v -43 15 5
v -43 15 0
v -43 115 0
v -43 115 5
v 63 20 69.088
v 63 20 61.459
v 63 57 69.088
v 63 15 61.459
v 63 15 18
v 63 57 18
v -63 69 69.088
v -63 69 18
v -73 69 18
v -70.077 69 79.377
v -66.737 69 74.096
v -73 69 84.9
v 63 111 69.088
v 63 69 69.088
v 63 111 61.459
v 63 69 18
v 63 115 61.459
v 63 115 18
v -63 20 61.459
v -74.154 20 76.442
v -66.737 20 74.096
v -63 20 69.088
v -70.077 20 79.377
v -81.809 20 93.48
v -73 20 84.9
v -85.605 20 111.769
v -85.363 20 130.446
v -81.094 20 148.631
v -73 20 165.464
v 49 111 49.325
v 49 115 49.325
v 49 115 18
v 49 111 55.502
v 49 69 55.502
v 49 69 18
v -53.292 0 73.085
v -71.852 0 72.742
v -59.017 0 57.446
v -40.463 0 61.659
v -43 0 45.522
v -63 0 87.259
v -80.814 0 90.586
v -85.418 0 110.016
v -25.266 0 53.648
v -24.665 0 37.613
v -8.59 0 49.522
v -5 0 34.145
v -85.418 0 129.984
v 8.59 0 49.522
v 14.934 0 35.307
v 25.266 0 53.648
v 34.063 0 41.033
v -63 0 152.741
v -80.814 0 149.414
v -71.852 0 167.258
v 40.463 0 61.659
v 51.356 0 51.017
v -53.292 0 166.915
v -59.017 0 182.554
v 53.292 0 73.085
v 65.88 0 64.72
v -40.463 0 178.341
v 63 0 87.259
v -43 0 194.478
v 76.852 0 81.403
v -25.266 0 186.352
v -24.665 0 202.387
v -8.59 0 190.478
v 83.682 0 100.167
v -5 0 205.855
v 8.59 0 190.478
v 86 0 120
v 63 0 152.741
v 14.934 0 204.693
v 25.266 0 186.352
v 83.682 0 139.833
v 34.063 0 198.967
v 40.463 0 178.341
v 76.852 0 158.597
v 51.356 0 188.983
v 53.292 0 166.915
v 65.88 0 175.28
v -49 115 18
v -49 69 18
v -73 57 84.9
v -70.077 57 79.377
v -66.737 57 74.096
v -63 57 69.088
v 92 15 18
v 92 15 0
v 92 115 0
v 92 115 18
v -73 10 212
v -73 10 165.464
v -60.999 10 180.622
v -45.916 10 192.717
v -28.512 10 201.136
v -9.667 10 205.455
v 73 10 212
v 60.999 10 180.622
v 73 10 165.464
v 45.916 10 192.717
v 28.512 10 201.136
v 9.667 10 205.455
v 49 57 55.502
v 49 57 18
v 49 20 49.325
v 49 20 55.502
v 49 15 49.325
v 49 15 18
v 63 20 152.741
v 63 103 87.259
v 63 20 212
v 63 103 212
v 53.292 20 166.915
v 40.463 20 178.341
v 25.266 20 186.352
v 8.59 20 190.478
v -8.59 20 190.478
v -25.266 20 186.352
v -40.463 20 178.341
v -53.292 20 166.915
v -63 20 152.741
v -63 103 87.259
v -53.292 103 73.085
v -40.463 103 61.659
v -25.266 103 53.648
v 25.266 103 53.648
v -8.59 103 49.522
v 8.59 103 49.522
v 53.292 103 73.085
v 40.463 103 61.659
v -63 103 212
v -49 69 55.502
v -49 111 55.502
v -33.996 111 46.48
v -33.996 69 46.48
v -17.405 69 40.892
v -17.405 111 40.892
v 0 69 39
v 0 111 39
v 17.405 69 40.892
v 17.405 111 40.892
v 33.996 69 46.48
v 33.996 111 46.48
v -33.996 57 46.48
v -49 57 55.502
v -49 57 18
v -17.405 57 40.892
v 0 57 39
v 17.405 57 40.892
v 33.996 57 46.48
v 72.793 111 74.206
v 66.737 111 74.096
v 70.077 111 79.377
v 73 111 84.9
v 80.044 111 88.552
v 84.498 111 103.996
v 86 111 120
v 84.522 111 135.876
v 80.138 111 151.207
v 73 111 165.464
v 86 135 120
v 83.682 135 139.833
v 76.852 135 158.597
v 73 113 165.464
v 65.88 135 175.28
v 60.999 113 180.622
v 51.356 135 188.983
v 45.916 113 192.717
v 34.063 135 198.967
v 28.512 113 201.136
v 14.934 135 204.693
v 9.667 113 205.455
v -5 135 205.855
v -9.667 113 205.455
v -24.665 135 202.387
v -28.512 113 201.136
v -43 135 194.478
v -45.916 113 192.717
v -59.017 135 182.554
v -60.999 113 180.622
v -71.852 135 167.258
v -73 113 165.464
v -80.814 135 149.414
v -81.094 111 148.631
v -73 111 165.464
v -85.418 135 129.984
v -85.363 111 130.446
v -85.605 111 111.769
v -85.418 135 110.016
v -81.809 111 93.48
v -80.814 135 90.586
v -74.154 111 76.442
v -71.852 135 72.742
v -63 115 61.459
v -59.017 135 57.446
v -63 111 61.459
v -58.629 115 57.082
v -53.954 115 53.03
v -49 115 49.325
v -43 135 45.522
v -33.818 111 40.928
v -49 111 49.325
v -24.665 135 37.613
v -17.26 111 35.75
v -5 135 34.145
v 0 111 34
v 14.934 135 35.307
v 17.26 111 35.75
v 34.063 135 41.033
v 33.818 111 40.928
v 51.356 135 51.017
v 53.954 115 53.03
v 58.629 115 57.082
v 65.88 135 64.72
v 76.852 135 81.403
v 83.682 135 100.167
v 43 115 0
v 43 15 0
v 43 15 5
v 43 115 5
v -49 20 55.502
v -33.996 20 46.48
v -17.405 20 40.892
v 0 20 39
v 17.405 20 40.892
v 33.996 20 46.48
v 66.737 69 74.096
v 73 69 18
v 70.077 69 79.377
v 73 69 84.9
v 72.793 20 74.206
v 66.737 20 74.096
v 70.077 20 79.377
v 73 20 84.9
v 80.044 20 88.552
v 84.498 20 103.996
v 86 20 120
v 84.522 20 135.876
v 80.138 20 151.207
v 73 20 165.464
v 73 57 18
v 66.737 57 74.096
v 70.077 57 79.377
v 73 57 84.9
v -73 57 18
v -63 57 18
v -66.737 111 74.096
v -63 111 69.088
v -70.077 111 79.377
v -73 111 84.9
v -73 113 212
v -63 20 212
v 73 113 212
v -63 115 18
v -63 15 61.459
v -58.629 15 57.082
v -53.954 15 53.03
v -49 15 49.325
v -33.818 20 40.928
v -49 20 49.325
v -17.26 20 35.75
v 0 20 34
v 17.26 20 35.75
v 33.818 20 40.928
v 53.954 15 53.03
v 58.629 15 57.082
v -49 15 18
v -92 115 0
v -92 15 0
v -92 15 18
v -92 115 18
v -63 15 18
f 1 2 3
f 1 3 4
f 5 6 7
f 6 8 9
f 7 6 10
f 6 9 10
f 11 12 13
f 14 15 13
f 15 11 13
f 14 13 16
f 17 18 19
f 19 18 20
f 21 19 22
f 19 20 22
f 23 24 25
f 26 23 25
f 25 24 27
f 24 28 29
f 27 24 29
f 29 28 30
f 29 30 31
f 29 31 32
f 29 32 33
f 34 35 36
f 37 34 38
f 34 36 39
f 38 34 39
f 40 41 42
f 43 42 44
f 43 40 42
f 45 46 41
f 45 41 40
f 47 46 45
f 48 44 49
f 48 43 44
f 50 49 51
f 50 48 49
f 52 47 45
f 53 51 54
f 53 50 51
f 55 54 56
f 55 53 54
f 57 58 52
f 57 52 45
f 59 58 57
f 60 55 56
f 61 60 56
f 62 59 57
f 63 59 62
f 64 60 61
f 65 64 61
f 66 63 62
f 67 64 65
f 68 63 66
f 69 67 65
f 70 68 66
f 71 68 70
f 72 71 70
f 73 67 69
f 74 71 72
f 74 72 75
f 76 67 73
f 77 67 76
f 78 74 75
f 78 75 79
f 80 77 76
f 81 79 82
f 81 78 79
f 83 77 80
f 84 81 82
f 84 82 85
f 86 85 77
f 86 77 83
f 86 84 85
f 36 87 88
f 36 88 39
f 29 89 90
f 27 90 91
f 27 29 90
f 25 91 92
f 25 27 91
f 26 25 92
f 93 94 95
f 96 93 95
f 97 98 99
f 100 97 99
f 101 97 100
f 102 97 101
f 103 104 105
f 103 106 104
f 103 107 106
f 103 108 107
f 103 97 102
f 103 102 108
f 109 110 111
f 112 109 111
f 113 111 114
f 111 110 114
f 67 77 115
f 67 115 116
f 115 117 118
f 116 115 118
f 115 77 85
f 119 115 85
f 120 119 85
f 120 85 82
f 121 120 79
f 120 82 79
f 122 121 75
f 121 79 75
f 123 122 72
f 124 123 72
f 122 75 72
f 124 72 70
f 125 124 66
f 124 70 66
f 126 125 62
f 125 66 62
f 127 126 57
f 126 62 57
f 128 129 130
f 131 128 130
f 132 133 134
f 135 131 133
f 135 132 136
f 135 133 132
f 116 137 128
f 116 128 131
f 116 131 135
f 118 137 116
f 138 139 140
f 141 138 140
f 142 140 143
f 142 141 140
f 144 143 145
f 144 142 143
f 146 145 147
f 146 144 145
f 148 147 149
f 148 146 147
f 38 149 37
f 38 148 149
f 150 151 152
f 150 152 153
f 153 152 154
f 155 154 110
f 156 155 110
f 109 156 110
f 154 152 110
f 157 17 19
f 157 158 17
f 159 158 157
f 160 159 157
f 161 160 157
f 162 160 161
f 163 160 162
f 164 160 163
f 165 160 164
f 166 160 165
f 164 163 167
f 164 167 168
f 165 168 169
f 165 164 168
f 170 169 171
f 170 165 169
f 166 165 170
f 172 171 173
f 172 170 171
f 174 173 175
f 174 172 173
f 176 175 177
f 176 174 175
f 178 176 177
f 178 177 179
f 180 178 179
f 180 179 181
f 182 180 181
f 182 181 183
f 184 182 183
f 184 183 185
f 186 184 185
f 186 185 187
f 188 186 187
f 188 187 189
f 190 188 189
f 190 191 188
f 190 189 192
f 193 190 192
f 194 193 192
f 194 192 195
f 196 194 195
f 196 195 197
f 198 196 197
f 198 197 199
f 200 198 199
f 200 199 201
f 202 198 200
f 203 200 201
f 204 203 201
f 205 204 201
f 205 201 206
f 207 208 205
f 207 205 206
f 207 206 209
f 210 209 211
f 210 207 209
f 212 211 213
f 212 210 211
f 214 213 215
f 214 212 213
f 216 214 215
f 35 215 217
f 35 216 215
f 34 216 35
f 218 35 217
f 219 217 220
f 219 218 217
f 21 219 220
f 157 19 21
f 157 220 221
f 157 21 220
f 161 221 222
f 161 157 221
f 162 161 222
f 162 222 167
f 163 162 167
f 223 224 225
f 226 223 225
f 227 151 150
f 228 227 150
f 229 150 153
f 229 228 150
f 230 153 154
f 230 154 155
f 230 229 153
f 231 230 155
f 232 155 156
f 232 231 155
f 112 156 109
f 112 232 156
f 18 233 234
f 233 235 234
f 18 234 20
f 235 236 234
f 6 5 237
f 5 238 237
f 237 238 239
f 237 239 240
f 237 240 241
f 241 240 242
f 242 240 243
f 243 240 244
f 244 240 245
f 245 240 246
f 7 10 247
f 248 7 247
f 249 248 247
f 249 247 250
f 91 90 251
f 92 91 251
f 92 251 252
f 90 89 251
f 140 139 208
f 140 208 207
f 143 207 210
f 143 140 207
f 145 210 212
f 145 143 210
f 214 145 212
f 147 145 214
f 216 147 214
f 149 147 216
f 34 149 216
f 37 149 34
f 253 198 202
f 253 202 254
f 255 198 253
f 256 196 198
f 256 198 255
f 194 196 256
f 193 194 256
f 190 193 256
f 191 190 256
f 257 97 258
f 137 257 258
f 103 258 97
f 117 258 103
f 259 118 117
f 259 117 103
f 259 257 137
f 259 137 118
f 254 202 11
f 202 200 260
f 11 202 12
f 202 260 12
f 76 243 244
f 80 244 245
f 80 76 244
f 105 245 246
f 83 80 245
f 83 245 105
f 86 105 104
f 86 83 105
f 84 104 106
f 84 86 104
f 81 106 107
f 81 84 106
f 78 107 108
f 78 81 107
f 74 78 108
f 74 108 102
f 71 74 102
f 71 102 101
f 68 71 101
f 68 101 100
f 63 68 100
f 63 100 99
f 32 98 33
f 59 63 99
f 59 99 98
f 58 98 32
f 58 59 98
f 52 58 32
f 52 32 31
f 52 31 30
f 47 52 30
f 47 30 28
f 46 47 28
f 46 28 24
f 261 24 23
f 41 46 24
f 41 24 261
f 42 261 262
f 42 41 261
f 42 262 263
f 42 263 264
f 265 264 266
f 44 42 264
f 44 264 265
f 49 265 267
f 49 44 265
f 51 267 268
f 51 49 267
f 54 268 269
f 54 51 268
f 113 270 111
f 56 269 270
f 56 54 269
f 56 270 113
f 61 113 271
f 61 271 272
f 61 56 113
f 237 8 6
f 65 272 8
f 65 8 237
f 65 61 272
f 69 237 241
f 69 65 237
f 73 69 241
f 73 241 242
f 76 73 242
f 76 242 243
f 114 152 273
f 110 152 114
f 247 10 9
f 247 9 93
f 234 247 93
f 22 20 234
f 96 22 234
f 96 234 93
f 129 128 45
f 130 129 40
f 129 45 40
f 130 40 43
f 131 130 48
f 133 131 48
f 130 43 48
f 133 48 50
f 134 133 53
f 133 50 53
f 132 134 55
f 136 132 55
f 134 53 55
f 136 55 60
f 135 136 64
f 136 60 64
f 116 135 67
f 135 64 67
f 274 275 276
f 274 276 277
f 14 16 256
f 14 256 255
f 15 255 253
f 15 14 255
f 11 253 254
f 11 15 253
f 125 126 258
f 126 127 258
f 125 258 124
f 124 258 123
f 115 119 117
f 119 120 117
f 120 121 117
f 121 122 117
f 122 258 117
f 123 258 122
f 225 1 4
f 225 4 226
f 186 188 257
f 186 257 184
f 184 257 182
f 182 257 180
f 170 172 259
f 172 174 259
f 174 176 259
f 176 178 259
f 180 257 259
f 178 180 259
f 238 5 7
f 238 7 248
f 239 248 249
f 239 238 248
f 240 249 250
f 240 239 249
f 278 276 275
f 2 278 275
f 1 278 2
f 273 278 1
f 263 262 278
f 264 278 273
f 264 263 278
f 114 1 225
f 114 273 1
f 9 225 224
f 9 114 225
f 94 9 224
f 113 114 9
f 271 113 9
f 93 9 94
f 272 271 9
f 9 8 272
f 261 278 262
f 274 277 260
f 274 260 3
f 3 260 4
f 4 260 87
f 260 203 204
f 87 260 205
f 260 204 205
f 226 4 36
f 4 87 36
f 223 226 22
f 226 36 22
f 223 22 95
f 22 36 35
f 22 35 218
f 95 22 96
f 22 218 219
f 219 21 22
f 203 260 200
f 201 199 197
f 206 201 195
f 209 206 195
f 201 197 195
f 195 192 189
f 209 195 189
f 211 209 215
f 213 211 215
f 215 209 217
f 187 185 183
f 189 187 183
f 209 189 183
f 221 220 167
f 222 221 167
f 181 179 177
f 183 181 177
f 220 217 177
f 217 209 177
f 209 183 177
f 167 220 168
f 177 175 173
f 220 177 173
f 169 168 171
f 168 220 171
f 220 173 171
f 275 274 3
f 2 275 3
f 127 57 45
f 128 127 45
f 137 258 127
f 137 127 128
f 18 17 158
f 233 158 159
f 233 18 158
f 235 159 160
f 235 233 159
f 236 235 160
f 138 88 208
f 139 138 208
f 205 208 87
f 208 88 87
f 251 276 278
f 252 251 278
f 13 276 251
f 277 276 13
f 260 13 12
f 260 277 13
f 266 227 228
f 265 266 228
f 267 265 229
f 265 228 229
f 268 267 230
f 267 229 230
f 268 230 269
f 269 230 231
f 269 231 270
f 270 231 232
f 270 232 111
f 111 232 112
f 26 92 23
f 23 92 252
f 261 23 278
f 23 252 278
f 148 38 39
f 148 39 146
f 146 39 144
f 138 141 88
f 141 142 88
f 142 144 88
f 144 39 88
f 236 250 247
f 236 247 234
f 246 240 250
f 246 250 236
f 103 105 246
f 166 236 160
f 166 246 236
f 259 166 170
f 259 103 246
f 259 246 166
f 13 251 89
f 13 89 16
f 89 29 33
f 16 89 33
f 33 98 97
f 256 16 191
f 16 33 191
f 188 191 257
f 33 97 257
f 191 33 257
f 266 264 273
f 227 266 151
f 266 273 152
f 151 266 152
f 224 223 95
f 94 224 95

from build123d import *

# Parameters (mm, degrees)
F0_W      = 184
F0_H      = 100
F1_DEPTH  = 18
F2_W      = 86
F2_H      = 21.7137943208
F3_DEPTH  = 100.001
F5_DEPTH  = 92
F7_DEPTH  = 100
F8_R      = 86
F9_DEPTH  = 20
F10_START = -111
F10_DEPTH = 24
F12_W     = 146
F12_H     = 103
F13_DEPTH = 92
F15_DEPTH = 103
F16_W     = 126
F16_H     = 83
F17_DEPTH = 59.2595889125


with BuildPart() as f1:
    # F0 (on Top) → F1 (new body)
    with BuildSketch(Plane.XY):
        with Locations((0, 65)):
            Rectangle(F0_W, F0_H)
    extrude(amount=F1_DEPTH)

    # F2 (on face) → F3 (cut, through all)
    with BuildSketch(Plane.XZ.offset(-15)):
        with Locations((0, -5.8568971604)):
            Rectangle(F2_W, F2_H)
    extrude(amount=-F3_DEPTH, mode=Mode.SUBTRACT)

    # F4 (on face) → F5 (join)
    with BuildSketch(Plane.XY.offset(18)):
        Polygon((-63, 57), (-63, 15), (-49, 15), (-49, 57), (0, 57), (49, 57), (49, 15), (63, 15), (63, 57), (73, 57), (73, 69), (63, 69), (63, 115), (49, 115), (49, 69), (0, 69), (-49, 69), (-49, 115), (-63, 115), (-63, 69), (-73, 69), (-73, 57), align=None)
    extrude(amount=F5_DEPTH)

    # F6 (on face) → F7 (join)
    with BuildSketch(Plane.XZ.offset(-15)):
        with BuildLine():
            Line((-73, 120), (-73, 84.9001424504))
            ThreePointArc((-73, 84.9001424504), (0, 39), (73, 84.9001424504))
            Line((73, 84.9001424504), (73, 120))
            Line((73, 120), (-73, 120))
        make_face()
    extrude(amount=-F7_DEPTH)

    # F8 (on Front) → F9 (join)
    with BuildSketch(Plane.XZ):
        with Locations((0, 120)):
            Circle(F8_R)
    extrude(amount=-F9_DEPTH)

    # F8 (on Front) → F10 (join)
    with BuildSketch(Plane.XZ.offset(F10_START)):
        with Locations((0, 120)):
            Circle(F8_R)
    extrude(amount=-F10_DEPTH)

    # F12 (on offset) → F13 (join, through all)
    with BuildSketch(Plane.XY.offset(212)):
        with Locations((0, 61.5)):
            Rectangle(F12_W, F12_H)
    extrude(amount=-F13_DEPTH)

    # F14 (on face) → F15 (cut)
    with BuildSketch(Plane.XZ):
        with BuildLine():
            Line((-63, 152.7414110875), (-63, 87.2585889125))
            ThreePointArc((-63, 87.2585889125), (0, 49), (63, 87.2585889125))
            Line((63, 87.2585889125), (63, 152.7414110875))
            ThreePointArc((63, 152.7414110875), (0, 191), (-63, 152.7414110875))
        make_face()
    extrude(amount=-F15_DEPTH, mode=Mode.SUBTRACT)

    # F16 (on face) → F17 (cut, through all)
    with BuildSketch(Plane.XY.offset(212)):
        with Locations((0, 61.5)):
            Rectangle(F16_W, F16_H)
    extrude(amount=-F17_DEPTH, mode=Mode.SUBTRACT)


solid = f1.part
